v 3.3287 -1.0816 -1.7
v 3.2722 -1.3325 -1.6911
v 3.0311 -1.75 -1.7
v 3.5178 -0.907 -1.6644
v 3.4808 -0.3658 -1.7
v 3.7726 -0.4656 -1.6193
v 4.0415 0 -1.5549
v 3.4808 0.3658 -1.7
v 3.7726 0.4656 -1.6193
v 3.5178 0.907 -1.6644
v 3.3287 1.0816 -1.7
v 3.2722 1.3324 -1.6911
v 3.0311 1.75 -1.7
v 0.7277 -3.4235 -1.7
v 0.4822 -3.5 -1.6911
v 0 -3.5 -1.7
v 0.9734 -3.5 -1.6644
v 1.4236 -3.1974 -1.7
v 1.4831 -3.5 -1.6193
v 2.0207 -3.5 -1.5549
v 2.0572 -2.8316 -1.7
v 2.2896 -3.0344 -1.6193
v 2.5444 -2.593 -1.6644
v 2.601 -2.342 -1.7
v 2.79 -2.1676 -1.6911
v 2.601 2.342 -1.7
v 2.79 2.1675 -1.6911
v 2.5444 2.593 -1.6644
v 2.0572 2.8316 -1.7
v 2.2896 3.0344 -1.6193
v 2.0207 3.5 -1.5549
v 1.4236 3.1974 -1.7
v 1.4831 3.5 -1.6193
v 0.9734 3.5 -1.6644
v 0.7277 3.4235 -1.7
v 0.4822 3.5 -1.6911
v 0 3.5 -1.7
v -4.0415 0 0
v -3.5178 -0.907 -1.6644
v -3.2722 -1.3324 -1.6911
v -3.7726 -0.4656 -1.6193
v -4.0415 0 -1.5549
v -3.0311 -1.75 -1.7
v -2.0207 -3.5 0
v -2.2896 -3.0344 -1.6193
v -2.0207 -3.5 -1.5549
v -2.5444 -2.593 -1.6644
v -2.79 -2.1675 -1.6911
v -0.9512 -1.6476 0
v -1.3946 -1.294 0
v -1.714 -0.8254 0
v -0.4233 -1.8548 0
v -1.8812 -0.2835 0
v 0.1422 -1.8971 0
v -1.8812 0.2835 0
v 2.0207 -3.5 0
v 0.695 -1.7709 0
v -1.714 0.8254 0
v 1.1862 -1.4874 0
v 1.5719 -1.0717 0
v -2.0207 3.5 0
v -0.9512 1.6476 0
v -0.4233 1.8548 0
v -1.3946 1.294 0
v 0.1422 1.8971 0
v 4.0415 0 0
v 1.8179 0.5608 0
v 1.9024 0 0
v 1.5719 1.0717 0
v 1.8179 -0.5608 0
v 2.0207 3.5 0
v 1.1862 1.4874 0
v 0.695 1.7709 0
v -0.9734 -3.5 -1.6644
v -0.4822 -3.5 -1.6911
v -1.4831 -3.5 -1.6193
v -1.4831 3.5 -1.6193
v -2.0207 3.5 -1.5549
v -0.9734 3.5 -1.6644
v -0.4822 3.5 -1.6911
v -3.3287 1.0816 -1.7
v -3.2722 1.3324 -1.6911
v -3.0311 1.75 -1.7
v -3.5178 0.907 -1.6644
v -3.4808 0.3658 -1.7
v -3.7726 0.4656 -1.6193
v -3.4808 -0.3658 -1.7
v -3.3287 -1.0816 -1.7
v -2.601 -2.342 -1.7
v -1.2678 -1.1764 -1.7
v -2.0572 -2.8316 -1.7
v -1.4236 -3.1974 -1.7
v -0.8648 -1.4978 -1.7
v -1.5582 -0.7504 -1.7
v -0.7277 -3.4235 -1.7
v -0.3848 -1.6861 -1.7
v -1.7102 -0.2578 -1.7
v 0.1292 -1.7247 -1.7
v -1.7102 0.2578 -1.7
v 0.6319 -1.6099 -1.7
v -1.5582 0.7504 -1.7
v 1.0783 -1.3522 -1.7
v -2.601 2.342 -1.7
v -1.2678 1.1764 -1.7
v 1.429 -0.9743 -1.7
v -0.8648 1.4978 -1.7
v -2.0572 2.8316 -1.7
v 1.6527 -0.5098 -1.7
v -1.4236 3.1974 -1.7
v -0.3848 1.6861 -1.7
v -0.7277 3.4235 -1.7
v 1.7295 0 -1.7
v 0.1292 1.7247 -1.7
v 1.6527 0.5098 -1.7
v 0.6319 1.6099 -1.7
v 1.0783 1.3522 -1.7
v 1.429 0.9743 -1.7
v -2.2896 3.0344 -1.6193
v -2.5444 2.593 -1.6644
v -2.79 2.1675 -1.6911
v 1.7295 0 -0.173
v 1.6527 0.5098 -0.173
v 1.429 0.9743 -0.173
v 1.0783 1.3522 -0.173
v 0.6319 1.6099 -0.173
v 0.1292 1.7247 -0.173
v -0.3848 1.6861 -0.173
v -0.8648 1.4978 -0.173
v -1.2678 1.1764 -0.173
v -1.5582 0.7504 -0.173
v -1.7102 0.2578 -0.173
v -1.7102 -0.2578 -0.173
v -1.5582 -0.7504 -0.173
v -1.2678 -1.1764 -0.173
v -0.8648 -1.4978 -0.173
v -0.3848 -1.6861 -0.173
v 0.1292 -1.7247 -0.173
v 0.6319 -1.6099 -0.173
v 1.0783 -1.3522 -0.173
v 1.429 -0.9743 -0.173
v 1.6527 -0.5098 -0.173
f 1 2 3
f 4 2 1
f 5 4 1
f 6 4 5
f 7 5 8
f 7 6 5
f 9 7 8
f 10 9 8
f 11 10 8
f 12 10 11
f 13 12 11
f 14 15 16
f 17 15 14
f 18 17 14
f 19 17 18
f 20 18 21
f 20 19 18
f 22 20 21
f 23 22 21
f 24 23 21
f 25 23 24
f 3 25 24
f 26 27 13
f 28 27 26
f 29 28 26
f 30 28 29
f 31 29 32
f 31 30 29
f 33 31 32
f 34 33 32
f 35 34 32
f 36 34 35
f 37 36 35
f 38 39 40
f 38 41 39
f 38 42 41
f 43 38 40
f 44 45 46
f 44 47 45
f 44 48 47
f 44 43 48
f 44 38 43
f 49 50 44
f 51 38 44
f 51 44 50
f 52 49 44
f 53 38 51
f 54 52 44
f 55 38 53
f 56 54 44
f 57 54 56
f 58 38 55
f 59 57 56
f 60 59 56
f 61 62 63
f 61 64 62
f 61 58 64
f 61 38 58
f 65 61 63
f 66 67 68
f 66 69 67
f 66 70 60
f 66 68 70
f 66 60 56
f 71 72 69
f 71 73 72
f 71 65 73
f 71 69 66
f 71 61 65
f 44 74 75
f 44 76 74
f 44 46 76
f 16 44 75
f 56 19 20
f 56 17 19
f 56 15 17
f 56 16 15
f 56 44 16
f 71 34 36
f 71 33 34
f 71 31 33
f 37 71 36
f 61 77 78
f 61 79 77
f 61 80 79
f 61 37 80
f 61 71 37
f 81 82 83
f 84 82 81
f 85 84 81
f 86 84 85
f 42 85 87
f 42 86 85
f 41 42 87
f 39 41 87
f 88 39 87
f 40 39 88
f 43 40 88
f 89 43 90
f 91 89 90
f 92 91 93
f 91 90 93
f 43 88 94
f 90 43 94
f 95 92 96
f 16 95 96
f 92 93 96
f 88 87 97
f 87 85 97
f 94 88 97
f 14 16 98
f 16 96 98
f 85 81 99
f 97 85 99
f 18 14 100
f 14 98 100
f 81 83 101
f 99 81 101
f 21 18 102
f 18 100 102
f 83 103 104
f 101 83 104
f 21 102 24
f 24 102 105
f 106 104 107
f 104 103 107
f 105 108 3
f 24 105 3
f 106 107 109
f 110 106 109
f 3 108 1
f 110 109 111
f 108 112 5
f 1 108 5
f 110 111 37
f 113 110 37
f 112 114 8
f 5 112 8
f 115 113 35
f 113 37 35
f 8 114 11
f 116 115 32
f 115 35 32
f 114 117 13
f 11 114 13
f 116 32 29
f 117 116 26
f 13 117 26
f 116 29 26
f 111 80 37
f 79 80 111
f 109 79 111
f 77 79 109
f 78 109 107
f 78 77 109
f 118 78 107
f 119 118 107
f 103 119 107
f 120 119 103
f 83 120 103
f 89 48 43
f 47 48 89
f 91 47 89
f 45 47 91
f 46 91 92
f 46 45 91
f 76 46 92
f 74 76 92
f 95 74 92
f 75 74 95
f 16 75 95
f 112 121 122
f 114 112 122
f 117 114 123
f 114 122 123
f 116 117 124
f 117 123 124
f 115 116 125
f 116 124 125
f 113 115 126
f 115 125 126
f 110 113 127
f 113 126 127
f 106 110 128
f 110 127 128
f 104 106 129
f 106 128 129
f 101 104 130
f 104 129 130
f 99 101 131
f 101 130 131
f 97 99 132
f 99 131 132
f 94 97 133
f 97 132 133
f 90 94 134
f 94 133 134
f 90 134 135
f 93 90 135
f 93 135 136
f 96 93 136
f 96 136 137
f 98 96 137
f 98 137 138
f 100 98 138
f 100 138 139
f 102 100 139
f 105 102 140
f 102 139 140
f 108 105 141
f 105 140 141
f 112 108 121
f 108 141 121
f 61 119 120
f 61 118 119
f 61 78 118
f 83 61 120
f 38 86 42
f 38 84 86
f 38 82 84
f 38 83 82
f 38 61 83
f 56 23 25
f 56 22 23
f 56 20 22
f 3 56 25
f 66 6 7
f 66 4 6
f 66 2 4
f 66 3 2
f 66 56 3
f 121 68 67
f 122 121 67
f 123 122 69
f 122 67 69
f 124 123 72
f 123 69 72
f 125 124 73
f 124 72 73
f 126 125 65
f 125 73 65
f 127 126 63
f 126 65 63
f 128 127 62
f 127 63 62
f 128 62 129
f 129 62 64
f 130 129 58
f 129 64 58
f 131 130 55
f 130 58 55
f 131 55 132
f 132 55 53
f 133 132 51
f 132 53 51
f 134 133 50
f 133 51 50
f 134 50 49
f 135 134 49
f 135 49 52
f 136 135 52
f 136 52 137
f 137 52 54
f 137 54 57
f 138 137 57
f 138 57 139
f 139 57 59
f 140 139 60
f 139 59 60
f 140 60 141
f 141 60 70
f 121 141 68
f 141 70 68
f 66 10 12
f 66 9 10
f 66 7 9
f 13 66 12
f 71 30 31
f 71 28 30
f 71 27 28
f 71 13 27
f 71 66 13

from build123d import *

# Parameters (mm, degrees)
SKETCH1_R     = 1.7295
BASENUT_DEPTH = 1.7
CHAMFER1_SIZE = 0.17295


with BuildPart() as part:
    # Sketch1 → BaseNut (new body)
    with BuildSketch(Plane.XY):
        Polygon((2.020725942, -3.5), (4.041451884, 0), (2.020725942, 3.5), (-2.020725942, 3.5), (-4.041451884, 0), (-2.020725942, -3.5), align=None)
        Circle(SKETCH1_R, mode=Mode.SUBTRACT)
    extrude(amount=-BASENUT_DEPTH)

    # Sketch2 → Double-Chamfer (revolve, cut)
    with BuildSketch(Plane(origin=(0, 0, 0), x_dir=(1, 0, 0), z_dir=(0, 1, 0))):
        Polygon((-4.041451884, 1.7), (-3.5, 1.7), (-4.041451884, 1.554918405), align=None)
    revolve(axis=Axis((0, 0, -3.375940562), (0, 0, 1)), mode=Mode.SUBTRACT)

    # Chamfer1
    chamfer1_edges = [part.edges().sort_by_distance(p)[0] for p in [
        (-1.7295, 0, 0),
    ]]
    chamfer(chamfer1_edges, length=CHAMFER1_SIZE)


solid = part.part
